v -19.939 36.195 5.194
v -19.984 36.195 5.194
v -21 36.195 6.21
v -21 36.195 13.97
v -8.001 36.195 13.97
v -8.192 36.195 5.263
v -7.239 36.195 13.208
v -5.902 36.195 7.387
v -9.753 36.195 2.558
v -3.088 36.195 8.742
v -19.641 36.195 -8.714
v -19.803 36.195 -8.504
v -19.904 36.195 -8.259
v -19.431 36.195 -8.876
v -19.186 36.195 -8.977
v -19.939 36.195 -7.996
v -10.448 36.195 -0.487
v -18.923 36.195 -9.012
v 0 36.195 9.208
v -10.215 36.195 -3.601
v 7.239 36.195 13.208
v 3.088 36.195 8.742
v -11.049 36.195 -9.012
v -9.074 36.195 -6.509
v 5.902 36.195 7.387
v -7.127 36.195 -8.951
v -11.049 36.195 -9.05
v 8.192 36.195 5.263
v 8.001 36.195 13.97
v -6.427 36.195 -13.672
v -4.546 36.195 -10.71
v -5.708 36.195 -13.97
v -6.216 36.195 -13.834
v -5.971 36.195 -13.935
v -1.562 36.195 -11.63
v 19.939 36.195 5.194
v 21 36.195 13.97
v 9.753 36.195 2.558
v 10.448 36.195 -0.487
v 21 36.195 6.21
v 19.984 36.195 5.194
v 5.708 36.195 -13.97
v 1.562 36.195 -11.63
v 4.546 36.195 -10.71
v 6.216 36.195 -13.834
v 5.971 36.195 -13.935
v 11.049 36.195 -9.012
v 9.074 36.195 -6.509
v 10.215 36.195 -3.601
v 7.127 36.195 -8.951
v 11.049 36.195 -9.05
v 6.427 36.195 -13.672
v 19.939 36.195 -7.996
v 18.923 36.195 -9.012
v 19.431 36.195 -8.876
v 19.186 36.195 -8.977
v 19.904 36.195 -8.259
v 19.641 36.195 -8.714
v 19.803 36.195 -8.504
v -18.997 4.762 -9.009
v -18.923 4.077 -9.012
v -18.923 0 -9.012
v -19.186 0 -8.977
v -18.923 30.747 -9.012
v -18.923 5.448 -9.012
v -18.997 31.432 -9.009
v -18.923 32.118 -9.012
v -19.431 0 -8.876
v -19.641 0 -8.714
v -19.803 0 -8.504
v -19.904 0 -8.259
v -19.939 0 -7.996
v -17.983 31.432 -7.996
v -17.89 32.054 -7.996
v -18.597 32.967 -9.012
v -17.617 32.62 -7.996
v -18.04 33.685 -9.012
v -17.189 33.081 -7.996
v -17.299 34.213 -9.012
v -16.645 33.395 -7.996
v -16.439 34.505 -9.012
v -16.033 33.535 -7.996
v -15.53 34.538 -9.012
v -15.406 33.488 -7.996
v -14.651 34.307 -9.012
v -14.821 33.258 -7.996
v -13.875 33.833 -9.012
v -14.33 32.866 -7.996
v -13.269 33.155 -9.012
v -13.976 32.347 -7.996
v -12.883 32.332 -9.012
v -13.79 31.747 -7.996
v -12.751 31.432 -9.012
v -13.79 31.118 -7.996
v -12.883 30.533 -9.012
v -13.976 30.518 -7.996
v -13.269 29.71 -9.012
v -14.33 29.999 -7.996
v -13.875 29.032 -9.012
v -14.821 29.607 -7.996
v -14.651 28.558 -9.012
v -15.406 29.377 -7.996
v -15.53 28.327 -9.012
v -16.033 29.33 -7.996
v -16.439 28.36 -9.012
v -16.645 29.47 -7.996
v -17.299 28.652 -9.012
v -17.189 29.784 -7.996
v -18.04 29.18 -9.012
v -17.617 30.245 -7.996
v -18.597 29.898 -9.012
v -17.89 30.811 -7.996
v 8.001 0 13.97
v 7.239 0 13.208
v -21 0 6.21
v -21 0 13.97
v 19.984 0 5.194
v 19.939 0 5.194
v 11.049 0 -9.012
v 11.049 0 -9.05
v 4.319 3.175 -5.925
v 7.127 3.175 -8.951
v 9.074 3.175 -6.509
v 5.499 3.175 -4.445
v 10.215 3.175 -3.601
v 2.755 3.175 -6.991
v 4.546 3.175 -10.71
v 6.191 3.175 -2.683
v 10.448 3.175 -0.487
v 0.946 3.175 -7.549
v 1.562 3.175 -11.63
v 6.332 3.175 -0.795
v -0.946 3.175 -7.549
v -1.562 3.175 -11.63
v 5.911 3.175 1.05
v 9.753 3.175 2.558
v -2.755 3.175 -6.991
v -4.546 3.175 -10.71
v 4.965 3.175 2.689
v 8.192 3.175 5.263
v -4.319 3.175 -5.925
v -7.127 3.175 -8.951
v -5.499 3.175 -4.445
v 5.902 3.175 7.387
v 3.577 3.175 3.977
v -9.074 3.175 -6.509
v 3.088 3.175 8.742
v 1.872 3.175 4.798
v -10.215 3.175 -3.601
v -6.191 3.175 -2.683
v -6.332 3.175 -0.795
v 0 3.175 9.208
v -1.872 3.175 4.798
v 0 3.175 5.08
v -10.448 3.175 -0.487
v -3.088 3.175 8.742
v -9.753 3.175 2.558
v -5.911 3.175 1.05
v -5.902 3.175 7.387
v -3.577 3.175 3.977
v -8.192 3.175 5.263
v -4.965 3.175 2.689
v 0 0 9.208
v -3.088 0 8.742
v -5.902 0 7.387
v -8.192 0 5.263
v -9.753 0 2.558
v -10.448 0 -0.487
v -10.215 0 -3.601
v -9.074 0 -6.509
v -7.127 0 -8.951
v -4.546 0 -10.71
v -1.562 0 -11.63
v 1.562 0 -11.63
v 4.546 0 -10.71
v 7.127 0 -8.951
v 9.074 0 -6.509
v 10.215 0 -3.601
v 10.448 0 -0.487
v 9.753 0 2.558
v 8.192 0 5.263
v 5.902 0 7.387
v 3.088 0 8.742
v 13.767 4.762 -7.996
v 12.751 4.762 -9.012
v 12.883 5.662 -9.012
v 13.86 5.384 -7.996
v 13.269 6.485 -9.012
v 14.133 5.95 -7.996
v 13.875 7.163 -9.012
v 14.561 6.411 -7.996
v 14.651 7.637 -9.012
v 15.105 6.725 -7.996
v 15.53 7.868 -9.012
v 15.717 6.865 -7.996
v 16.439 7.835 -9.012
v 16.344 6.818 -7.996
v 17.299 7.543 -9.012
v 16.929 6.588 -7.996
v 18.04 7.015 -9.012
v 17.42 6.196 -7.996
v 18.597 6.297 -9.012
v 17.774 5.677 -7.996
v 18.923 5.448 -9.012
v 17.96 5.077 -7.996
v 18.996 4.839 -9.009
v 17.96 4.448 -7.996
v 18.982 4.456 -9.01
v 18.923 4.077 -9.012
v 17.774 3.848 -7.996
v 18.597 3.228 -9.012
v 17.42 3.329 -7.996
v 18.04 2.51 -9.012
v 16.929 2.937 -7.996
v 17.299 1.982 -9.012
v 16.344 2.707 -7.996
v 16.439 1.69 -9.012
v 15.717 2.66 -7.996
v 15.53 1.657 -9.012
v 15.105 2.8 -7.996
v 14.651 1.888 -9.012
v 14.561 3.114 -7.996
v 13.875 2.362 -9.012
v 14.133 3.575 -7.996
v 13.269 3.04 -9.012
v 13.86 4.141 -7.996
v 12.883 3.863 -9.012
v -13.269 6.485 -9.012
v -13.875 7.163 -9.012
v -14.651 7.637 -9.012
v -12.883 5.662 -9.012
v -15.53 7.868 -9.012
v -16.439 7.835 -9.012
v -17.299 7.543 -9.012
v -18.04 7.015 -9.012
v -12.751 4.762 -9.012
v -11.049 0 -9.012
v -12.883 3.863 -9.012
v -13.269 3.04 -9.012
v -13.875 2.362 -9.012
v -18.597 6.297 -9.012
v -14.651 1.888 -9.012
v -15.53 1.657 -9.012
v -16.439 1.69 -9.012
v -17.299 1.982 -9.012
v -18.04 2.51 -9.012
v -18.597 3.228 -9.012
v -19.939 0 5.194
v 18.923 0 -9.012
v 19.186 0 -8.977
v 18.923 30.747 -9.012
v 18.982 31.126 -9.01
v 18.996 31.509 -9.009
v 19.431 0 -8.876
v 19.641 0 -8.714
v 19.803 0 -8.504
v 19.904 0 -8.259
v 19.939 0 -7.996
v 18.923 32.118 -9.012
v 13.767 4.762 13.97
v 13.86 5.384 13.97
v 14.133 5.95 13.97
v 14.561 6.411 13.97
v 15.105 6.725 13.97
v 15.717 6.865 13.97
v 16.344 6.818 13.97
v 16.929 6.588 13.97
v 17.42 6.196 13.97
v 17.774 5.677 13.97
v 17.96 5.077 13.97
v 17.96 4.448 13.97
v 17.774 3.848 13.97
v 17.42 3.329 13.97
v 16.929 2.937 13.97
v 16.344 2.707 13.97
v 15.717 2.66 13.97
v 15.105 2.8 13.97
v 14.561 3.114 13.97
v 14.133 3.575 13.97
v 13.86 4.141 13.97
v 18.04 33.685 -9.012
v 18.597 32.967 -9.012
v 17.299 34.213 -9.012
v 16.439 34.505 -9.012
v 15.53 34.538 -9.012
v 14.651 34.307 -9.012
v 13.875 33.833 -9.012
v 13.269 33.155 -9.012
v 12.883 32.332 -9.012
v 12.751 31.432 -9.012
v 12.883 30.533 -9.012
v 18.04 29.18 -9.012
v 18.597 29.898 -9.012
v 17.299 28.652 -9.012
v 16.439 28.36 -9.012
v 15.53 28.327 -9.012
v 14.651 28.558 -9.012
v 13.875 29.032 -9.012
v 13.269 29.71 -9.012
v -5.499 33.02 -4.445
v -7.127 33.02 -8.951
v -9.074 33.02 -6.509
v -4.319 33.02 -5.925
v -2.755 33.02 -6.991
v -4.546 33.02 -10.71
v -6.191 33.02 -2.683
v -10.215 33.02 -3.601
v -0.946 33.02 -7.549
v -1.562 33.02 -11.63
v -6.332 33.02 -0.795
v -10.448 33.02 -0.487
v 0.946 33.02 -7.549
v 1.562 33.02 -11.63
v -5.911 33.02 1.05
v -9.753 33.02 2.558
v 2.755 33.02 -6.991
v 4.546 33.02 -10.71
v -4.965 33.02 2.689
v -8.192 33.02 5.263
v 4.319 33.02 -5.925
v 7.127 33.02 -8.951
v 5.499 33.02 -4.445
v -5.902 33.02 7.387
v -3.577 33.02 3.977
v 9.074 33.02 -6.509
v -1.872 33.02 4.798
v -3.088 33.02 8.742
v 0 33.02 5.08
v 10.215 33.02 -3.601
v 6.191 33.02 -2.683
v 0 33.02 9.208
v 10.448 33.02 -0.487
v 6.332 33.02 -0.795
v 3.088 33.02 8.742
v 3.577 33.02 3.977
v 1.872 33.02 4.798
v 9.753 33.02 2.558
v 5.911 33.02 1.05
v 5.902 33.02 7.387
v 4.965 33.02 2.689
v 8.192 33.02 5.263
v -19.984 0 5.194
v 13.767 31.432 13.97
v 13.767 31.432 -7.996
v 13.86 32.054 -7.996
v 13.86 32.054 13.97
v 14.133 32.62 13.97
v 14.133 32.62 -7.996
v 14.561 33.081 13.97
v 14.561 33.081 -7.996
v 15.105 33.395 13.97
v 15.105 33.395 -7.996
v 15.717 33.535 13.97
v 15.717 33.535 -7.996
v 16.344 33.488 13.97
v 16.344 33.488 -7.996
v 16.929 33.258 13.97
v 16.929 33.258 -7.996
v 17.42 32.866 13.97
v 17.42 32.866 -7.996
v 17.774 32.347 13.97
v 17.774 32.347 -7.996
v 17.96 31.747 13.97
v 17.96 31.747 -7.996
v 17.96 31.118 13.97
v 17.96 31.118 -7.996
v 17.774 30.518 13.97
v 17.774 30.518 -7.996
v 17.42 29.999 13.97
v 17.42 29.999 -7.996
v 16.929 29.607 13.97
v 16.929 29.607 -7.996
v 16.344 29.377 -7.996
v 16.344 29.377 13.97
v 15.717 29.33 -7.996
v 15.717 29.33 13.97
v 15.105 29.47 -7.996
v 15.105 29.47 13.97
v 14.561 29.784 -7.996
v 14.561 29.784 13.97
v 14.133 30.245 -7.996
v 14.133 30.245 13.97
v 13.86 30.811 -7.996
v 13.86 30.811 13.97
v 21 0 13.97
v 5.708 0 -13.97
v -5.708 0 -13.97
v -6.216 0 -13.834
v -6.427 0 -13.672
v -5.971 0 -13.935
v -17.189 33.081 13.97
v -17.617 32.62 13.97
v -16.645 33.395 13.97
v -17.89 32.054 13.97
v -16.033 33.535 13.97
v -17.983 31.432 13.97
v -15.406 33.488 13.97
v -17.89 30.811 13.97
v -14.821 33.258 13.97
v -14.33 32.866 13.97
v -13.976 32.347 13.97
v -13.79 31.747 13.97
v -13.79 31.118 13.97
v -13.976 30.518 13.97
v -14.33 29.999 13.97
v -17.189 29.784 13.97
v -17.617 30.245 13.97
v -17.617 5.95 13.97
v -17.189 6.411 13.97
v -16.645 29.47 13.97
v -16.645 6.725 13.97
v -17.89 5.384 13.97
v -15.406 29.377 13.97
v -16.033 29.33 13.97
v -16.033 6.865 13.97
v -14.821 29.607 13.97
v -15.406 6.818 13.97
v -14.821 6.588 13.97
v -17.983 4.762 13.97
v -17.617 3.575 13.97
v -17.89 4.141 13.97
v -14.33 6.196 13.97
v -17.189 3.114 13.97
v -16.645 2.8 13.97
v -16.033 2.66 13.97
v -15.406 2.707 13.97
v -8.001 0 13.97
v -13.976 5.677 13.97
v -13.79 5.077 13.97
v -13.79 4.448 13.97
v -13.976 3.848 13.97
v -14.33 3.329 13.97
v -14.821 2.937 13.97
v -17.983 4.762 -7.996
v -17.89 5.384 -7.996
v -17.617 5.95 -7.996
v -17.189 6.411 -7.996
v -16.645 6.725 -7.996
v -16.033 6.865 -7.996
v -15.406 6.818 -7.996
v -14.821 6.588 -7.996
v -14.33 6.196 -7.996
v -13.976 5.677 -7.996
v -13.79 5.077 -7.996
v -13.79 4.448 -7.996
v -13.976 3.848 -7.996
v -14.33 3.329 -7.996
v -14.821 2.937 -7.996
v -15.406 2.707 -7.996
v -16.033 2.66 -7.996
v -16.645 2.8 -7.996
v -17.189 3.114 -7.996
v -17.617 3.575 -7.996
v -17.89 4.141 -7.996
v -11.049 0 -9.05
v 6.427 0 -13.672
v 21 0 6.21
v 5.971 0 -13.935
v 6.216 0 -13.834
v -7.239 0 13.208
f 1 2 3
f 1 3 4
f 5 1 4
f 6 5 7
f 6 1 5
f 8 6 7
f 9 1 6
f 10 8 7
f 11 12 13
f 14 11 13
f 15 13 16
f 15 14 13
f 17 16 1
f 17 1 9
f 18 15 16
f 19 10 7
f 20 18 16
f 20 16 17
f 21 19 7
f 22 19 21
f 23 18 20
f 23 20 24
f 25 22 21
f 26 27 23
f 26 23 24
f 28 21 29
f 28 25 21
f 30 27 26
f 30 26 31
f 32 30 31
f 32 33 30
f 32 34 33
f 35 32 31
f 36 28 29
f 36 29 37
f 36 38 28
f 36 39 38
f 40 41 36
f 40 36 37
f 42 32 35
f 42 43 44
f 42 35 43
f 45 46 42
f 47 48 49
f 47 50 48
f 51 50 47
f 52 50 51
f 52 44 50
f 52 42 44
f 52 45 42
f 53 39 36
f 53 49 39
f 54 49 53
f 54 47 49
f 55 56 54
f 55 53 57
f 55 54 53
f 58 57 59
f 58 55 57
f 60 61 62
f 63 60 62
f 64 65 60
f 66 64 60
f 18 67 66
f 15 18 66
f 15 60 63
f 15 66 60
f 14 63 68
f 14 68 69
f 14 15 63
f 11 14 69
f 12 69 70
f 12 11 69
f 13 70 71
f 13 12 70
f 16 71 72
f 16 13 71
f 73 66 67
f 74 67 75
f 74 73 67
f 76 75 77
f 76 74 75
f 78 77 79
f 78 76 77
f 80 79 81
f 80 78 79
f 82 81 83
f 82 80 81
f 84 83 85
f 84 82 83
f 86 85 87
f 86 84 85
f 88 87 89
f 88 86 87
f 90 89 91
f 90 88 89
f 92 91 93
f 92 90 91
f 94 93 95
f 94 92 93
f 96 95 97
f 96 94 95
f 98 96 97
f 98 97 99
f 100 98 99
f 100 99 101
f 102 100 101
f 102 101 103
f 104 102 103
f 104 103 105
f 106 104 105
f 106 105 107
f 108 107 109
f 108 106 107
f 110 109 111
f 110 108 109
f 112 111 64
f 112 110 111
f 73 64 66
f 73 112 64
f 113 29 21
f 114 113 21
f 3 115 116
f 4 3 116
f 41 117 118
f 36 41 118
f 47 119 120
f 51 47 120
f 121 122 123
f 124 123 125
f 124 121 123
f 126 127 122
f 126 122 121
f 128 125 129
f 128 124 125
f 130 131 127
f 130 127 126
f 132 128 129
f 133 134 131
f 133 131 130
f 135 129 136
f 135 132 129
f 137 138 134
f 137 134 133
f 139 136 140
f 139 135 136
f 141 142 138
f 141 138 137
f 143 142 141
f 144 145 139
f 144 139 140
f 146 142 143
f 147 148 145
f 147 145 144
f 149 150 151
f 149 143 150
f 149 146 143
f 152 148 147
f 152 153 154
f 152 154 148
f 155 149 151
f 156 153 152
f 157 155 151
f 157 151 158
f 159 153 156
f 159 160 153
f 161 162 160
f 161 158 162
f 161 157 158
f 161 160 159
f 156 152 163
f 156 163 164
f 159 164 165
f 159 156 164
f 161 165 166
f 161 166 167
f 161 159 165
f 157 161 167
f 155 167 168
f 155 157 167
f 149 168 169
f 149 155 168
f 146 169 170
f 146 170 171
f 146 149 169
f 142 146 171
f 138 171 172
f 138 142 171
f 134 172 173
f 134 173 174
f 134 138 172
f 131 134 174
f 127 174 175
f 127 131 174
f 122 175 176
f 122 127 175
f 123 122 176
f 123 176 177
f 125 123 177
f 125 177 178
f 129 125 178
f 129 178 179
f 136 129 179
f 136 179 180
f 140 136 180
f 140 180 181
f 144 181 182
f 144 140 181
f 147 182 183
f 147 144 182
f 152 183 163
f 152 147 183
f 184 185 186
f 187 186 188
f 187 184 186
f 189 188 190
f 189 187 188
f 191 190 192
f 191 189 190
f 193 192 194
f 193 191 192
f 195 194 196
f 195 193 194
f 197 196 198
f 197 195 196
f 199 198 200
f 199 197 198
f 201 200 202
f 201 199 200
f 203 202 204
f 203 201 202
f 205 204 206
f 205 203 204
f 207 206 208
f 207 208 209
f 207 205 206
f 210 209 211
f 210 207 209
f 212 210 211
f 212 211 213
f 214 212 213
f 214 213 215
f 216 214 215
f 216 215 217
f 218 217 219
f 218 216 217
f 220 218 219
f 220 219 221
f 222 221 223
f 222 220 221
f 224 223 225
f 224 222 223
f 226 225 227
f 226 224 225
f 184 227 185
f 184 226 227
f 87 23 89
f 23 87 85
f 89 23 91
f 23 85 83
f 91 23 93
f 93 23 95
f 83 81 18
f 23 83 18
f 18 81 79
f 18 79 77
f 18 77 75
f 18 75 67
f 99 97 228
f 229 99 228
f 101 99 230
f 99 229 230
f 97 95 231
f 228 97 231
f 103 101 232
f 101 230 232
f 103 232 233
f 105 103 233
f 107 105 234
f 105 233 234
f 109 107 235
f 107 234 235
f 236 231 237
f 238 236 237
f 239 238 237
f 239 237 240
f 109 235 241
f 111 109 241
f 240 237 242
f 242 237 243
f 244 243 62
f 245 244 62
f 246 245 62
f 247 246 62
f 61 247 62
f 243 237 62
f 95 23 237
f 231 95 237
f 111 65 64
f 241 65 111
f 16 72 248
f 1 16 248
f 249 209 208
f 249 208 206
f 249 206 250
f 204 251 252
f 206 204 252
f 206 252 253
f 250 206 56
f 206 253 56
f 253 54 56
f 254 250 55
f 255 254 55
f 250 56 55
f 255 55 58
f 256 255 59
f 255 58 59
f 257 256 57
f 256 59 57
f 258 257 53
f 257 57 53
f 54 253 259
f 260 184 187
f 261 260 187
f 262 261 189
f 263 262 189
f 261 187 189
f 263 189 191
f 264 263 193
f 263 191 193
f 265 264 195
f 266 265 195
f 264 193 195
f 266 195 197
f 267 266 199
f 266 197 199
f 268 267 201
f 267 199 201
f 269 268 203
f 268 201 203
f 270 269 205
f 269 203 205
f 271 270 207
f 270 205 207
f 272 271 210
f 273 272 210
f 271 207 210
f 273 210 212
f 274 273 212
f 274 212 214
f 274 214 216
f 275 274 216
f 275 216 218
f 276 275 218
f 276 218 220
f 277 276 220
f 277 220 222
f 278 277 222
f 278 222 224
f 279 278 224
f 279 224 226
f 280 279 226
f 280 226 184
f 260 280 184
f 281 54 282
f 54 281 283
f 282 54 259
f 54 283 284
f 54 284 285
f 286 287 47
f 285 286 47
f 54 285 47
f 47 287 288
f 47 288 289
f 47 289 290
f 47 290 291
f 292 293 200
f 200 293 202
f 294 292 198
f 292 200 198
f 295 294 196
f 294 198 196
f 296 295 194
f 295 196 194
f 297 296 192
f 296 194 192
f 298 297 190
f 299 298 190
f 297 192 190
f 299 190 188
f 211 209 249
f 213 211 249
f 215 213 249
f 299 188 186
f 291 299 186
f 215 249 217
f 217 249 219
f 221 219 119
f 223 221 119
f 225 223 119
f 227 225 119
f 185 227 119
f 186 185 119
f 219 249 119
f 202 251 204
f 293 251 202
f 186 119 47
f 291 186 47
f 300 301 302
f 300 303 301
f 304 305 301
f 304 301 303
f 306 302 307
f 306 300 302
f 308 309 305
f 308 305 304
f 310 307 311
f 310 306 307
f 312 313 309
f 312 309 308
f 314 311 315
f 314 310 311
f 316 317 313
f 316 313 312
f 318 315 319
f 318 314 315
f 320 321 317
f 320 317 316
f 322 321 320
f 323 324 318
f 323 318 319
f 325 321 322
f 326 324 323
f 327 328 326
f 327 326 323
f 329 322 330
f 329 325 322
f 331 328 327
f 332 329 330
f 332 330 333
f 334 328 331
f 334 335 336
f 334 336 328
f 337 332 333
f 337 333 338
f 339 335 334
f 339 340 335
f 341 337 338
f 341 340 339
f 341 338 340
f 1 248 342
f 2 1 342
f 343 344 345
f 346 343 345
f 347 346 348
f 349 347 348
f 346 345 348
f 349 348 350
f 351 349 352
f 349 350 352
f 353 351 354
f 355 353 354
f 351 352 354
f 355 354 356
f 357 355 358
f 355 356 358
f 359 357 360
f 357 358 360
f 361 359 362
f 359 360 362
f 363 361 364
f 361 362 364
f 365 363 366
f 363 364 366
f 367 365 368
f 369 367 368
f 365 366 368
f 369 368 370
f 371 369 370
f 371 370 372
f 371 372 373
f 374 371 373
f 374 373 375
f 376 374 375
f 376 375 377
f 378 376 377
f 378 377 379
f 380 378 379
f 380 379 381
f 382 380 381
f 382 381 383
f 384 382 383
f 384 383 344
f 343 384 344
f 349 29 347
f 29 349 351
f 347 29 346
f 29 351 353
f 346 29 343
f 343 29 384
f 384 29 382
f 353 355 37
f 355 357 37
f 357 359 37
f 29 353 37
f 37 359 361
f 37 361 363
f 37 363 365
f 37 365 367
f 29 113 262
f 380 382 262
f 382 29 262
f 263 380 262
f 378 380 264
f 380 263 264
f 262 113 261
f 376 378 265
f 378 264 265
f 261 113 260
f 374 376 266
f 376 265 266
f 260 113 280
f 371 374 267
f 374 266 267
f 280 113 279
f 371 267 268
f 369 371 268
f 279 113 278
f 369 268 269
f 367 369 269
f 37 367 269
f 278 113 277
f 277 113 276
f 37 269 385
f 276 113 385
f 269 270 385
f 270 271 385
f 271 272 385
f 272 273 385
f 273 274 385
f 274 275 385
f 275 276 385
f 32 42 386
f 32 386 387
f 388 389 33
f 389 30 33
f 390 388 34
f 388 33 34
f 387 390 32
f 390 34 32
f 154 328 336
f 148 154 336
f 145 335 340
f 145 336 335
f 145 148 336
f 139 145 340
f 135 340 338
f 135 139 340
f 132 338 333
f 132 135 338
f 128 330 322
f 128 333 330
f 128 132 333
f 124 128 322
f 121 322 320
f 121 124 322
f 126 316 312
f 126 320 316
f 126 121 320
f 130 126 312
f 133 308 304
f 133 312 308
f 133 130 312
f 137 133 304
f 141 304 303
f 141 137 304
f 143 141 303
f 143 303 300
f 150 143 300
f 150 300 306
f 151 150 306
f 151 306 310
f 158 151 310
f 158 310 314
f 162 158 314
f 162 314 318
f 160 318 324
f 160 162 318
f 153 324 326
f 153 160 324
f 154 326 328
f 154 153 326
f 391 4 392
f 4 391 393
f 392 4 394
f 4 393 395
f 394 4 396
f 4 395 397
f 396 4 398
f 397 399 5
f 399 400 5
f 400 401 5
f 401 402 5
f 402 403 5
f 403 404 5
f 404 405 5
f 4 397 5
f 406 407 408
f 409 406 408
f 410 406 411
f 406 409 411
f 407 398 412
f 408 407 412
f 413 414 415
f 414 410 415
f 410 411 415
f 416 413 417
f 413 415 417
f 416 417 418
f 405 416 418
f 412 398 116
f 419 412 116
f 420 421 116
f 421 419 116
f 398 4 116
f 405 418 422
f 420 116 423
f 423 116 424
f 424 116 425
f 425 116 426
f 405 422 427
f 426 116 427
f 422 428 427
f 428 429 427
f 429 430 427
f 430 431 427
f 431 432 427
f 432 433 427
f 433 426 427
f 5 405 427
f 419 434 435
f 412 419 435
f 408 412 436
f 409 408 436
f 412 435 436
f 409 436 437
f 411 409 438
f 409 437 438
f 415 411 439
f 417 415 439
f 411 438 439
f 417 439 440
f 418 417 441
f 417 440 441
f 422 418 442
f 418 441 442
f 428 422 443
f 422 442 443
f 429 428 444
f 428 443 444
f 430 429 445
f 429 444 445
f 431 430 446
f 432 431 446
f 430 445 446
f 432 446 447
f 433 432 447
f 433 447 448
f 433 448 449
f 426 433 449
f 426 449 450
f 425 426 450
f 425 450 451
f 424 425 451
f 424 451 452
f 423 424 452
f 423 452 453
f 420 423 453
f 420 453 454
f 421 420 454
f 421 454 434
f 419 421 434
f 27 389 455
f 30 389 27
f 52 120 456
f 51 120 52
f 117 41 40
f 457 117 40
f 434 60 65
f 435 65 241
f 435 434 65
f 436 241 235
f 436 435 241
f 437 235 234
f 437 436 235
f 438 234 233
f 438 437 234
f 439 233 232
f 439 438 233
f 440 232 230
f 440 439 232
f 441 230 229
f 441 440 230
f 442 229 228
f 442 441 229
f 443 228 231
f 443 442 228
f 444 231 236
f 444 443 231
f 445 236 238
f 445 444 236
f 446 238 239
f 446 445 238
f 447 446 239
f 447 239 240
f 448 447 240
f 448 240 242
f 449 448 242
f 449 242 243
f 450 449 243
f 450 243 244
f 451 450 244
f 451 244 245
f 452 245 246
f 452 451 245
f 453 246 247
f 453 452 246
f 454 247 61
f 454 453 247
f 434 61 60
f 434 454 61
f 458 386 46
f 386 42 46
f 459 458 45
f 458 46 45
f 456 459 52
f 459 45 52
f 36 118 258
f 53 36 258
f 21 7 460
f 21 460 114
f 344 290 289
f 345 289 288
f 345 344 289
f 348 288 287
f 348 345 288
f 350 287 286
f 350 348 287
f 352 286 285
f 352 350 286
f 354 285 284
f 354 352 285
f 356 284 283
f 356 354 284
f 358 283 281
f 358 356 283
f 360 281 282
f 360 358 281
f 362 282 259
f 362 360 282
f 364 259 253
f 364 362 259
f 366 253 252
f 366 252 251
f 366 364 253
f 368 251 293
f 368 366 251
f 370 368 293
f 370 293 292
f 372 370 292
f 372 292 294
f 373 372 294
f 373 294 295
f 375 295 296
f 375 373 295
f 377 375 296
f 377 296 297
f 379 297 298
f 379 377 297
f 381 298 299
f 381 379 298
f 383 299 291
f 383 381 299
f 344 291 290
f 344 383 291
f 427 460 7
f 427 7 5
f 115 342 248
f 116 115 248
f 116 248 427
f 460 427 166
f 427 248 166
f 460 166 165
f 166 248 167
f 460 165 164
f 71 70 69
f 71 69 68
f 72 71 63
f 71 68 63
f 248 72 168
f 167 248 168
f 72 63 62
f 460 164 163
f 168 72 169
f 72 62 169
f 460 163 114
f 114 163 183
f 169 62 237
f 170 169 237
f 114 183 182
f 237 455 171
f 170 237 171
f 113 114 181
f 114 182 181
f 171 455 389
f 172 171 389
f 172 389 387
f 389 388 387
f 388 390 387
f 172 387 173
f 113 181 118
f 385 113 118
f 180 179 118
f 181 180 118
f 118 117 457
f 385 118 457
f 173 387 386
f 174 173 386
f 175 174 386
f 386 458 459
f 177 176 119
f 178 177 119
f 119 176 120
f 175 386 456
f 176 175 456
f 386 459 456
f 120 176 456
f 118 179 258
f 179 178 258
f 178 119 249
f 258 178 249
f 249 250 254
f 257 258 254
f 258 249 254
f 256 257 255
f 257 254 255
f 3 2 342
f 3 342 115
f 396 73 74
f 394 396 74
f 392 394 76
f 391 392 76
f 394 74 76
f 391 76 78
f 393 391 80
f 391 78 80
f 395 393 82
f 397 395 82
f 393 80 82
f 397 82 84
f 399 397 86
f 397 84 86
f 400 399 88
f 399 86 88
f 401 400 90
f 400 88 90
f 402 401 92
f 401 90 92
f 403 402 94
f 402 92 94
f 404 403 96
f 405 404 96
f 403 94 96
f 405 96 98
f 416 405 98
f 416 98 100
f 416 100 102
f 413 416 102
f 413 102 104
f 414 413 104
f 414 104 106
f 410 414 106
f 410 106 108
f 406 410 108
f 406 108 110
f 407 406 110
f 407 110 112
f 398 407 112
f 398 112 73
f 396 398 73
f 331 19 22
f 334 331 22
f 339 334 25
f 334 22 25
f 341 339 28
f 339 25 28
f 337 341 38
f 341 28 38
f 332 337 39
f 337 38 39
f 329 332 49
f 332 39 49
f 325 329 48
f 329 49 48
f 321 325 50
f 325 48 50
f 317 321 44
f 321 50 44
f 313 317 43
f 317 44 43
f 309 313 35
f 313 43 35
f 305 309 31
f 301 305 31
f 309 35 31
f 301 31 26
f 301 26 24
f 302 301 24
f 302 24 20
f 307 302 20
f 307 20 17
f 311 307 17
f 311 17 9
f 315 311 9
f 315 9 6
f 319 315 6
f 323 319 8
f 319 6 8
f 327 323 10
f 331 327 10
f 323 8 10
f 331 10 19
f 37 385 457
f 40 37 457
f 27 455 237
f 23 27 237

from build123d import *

# Parameters (mm, degrees)
SKETCH1_R           = 6.35
BOSS_EXTRUDE1_DEPTH = 36.195
CHAMFER1_SIZE       = 4.92
CHAMFER2_SIZE       = 1.016
FILLET1_R           = 1.016
SKETCH2_R           = 10.4775
CUT_EXTRUDE1_DEPTH  = 3.175
CUT_EXTRUDE2_START  = -3.175
SKETCH3_R           = 10.4775
CUT_EXTRUDE2_DEPTH  = 3.175
SKETCH4_R           = 2.1082
CUT_EXTRUDE3_DEPTH  = 29.337
CHAMFER3_SIZE       = 1.016


with BuildPart() as part:
    # Sketch1 → Boss-Extrude1 (new body)
    with BuildSketch(Plane(origin=(0, 0, 0), x_dir=(1, 0, 0), z_dir=(0, 1, 0))):
        Polygon((-21, -13.97), (-6.985, -13.97), (-6.985, -13.208), (6.985, -13.208), (6.985, -13.97), (21, -13.97), (21, -5.194), (19.939, -5.194), (19.939, 9.011817488), (11.049, 9.011817488), (11.049, 13.97), (-11.049, 13.97), (-11.049, 9.011817488), (-19.939, 9.011817488), (-19.939, -5.194), (-21, -5.194), align=None)
        with Locations(Location((0, 1.27, 0), (0, 0, 270))):
            Circle(SKETCH1_R, mode=Mode.SUBTRACT)
    extrude(amount=BOSS_EXTRUDE1_DEPTH)

    # Chamfer1
    chamfer1_edges = [part.edges().sort_by_distance(p)[0] for p in [
        (-11.049, 18.0975, -13.97),
        (11.049, 18.0975, -13.97),
    ]]
    chamfer(chamfer1_edges, length=CHAMFER1_SIZE)

    # Chamfer2
    # the kernel refuses this chamfer: 1.016 mm, written as the material it takes off along each edge
    with BuildSketch(Plane(origin=(6.985, -2.612829916, 13.97), x_dir=(0.9996219169112968, 0, 0.027495876610587285), z_dir=(0, 1, 0))) as chamfer2_piece_1_section:
        Polygon((CHAMFER2_SIZE * 0.999621916911, CHAMFER2_SIZE * 0.0274958766106), (-CHAMFER2_SIZE * 0.0274958766106, CHAMFER2_SIZE * 0.999621916911), (0, 0), align=None)
    chamfer2_piece_1 = extrude(amount=41.420659832, mode=Mode.PRIVATE)
    chamfer2_piece_1 = split(chamfer2_piece_1, bisect_by=Plane(origin=(7.342590456, 18.0975, 13.208), z_dir=(0, 0, 1)), keep=Keep.TOP, mode=Mode.PRIVATE)
    add(chamfer2_piece_1, mode=Mode.SUBTRACT)
    with BuildSketch(Plane(origin=(-6.985, -2.612829916, 13.97), x_dir=(0.027495876610586455, 0, -0.9996219169112968), z_dir=(0, 1, 0))) as chamfer2_piece_2_section:
        Polygon((CHAMFER2_SIZE * 0.999621916911, CHAMFER2_SIZE * 0.0274958766106), (-CHAMFER2_SIZE * 0.0274958766106, CHAMFER2_SIZE * 0.999621916911), (0, 0), align=None)
    chamfer2_piece_2 = extrude(amount=41.420659832, mode=Mode.PRIVATE)
    chamfer2_piece_2 = split(chamfer2_piece_2, bisect_by=Plane(origin=(-7.342590456, 18.0975, 13.208), z_dir=(0, 0, 1)), keep=Keep.TOP, mode=Mode.PRIVATE)
    add(chamfer2_piece_2, mode=Mode.SUBTRACT)
    with BuildSketch(Plane(origin=(-21, -2.612829916, 5.194), x_dir=(0.9996219169112968, 0, -0.02749587661058551), z_dir=(0, 1, 0))) as chamfer2_piece_3:
        Polygon((CHAMFER2_SIZE * 0.999621916911, -CHAMFER2_SIZE * 0.0274958766106), (-CHAMFER2_SIZE * 0.0274958766106, -CHAMFER2_SIZE * 0.999621916911), (0, 0), align=None)
    extrude(amount=41.420659832, mode=Mode.SUBTRACT)
    with BuildSketch(Plane(origin=(21, -2.612829916, 5.194), x_dir=(-0.9996219169112968, 0, -0.027495876610584665), z_dir=(0, 1, 0))) as chamfer2_piece_4:
        Polygon((CHAMFER2_SIZE * 0.999621916911, CHAMFER2_SIZE * 0.0274958766106), (-CHAMFER2_SIZE * 0.0274958766106, CHAMFER2_SIZE * 0.999621916911), (0, 0), align=None)
    extrude(amount=41.420659832, mode=Mode.SUBTRACT)

    # Fillet1
    fillet1_edges = [part.edges().sort_by_distance(p)[0] for p in [
        (-19.939, 18.0975, -9.011817488),
        (19.939, 18.0975, -9.011817488),
        (-6.129, 18.0975, -13.97),
        (6.129, 18.0975, -13.97),
    ]]
    fillet(fillet1_edges, radius=FILLET1_R)

    # Sketch2 → Cut-Extrude1 (cut)
    with BuildSketch(Plane(origin=(0, 36.195, 0), x_dir=(1, 0, 0), z_dir=(0, 1, 0))):
        with Locations(Location((0, 1.27, 0), (0, 0, 270))):
            Circle(SKETCH2_R)
    extrude(amount=-CUT_EXTRUDE1_DEPTH, mode=Mode.SUBTRACT)

    # Sketch3 → Cut-Extrude2 (cut)
    with BuildSketch(Plane.XZ.offset(CUT_EXTRUDE2_START)):
        with Locations(Location((0, -1.27, 0), (0, 0, 90))):
            Circle(SKETCH3_R)
    extrude(amount=CUT_EXTRUDE2_DEPTH, mode=Mode.SUBTRACT)

    # Sketch4 → Cut-Extrude3 (cut)
    with BuildSketch(Plane(origin=(0, 0, -9.011817488), x_dir=(-1, 0, 0), z_dir=(0, 0, -1))):
        with Locations((-15.875, 4.7625)):
            Circle(SKETCH4_R)
        with Locations((-15.875, 31.4325)):
            Circle(SKETCH4_R)
        with Locations((15.875, 31.4325)):
            Circle(SKETCH4_R)
        with Locations((15.875, 4.7625)):
            Circle(SKETCH4_R)
    extrude(amount=-CUT_EXTRUDE3_DEPTH, mode=Mode.SUBTRACT)

    # Chamfer3
    # the kernel refuses this chamfer: 1.016 mm, written as the material it takes off along each edge
    with BuildSketch(Plane(origin=(-15.875, 4.7625, -9.011817488), x_dir=(-1, 0, 0), z_dir=(0, -1, 0))) as chamfer3_piece_1:
        Polygon((2.1082 + CHAMFER3_SIZE, 0), (2.1082, -CHAMFER3_SIZE), (2.1082, 0), align=None)
    revolve(axis=Axis((-15.875, 4.7625, -9.011817488), (0, 0, -1)), mode=Mode.SUBTRACT)
    with BuildSketch(Plane(origin=(-15.875, 31.4325, -9.011817488), x_dir=(-1, 0, 0), z_dir=(0, -1, 0))) as chamfer3_piece_2:
        Polygon((2.1082 + CHAMFER3_SIZE, 0), (2.1082, -CHAMFER3_SIZE), (2.1082, 0), align=None)
    revolve(axis=Axis((-15.875, 31.4325, -9.011817488), (0, 0, -1)), mode=Mode.SUBTRACT)
    with BuildSketch(Plane(origin=(15.875, 31.4325, -9.011817488), x_dir=(-1, 0, 0), z_dir=(0, -1, 0))) as chamfer3_piece_3:
        Polygon((2.1082 + CHAMFER3_SIZE, 0), (2.1082, -CHAMFER3_SIZE), (2.1082, 0), align=None)
    revolve(axis=Axis((15.875, 31.4325, -9.011817488), (0, 0, -1)), mode=Mode.SUBTRACT)
    with BuildSketch(Plane(origin=(15.875, 4.7625, -9.011817488), x_dir=(-1, 0, 0), z_dir=(0, -1, 0))) as chamfer3_piece_4:
        Polygon((2.1082 + CHAMFER3_SIZE, 0), (2.1082, -CHAMFER3_SIZE), (2.1082, 0), align=None)
    revolve(axis=Axis((15.875, 4.7625, -9.011817488), (0, 0, -1)), mode=Mode.SUBTRACT)


solid = part.part
